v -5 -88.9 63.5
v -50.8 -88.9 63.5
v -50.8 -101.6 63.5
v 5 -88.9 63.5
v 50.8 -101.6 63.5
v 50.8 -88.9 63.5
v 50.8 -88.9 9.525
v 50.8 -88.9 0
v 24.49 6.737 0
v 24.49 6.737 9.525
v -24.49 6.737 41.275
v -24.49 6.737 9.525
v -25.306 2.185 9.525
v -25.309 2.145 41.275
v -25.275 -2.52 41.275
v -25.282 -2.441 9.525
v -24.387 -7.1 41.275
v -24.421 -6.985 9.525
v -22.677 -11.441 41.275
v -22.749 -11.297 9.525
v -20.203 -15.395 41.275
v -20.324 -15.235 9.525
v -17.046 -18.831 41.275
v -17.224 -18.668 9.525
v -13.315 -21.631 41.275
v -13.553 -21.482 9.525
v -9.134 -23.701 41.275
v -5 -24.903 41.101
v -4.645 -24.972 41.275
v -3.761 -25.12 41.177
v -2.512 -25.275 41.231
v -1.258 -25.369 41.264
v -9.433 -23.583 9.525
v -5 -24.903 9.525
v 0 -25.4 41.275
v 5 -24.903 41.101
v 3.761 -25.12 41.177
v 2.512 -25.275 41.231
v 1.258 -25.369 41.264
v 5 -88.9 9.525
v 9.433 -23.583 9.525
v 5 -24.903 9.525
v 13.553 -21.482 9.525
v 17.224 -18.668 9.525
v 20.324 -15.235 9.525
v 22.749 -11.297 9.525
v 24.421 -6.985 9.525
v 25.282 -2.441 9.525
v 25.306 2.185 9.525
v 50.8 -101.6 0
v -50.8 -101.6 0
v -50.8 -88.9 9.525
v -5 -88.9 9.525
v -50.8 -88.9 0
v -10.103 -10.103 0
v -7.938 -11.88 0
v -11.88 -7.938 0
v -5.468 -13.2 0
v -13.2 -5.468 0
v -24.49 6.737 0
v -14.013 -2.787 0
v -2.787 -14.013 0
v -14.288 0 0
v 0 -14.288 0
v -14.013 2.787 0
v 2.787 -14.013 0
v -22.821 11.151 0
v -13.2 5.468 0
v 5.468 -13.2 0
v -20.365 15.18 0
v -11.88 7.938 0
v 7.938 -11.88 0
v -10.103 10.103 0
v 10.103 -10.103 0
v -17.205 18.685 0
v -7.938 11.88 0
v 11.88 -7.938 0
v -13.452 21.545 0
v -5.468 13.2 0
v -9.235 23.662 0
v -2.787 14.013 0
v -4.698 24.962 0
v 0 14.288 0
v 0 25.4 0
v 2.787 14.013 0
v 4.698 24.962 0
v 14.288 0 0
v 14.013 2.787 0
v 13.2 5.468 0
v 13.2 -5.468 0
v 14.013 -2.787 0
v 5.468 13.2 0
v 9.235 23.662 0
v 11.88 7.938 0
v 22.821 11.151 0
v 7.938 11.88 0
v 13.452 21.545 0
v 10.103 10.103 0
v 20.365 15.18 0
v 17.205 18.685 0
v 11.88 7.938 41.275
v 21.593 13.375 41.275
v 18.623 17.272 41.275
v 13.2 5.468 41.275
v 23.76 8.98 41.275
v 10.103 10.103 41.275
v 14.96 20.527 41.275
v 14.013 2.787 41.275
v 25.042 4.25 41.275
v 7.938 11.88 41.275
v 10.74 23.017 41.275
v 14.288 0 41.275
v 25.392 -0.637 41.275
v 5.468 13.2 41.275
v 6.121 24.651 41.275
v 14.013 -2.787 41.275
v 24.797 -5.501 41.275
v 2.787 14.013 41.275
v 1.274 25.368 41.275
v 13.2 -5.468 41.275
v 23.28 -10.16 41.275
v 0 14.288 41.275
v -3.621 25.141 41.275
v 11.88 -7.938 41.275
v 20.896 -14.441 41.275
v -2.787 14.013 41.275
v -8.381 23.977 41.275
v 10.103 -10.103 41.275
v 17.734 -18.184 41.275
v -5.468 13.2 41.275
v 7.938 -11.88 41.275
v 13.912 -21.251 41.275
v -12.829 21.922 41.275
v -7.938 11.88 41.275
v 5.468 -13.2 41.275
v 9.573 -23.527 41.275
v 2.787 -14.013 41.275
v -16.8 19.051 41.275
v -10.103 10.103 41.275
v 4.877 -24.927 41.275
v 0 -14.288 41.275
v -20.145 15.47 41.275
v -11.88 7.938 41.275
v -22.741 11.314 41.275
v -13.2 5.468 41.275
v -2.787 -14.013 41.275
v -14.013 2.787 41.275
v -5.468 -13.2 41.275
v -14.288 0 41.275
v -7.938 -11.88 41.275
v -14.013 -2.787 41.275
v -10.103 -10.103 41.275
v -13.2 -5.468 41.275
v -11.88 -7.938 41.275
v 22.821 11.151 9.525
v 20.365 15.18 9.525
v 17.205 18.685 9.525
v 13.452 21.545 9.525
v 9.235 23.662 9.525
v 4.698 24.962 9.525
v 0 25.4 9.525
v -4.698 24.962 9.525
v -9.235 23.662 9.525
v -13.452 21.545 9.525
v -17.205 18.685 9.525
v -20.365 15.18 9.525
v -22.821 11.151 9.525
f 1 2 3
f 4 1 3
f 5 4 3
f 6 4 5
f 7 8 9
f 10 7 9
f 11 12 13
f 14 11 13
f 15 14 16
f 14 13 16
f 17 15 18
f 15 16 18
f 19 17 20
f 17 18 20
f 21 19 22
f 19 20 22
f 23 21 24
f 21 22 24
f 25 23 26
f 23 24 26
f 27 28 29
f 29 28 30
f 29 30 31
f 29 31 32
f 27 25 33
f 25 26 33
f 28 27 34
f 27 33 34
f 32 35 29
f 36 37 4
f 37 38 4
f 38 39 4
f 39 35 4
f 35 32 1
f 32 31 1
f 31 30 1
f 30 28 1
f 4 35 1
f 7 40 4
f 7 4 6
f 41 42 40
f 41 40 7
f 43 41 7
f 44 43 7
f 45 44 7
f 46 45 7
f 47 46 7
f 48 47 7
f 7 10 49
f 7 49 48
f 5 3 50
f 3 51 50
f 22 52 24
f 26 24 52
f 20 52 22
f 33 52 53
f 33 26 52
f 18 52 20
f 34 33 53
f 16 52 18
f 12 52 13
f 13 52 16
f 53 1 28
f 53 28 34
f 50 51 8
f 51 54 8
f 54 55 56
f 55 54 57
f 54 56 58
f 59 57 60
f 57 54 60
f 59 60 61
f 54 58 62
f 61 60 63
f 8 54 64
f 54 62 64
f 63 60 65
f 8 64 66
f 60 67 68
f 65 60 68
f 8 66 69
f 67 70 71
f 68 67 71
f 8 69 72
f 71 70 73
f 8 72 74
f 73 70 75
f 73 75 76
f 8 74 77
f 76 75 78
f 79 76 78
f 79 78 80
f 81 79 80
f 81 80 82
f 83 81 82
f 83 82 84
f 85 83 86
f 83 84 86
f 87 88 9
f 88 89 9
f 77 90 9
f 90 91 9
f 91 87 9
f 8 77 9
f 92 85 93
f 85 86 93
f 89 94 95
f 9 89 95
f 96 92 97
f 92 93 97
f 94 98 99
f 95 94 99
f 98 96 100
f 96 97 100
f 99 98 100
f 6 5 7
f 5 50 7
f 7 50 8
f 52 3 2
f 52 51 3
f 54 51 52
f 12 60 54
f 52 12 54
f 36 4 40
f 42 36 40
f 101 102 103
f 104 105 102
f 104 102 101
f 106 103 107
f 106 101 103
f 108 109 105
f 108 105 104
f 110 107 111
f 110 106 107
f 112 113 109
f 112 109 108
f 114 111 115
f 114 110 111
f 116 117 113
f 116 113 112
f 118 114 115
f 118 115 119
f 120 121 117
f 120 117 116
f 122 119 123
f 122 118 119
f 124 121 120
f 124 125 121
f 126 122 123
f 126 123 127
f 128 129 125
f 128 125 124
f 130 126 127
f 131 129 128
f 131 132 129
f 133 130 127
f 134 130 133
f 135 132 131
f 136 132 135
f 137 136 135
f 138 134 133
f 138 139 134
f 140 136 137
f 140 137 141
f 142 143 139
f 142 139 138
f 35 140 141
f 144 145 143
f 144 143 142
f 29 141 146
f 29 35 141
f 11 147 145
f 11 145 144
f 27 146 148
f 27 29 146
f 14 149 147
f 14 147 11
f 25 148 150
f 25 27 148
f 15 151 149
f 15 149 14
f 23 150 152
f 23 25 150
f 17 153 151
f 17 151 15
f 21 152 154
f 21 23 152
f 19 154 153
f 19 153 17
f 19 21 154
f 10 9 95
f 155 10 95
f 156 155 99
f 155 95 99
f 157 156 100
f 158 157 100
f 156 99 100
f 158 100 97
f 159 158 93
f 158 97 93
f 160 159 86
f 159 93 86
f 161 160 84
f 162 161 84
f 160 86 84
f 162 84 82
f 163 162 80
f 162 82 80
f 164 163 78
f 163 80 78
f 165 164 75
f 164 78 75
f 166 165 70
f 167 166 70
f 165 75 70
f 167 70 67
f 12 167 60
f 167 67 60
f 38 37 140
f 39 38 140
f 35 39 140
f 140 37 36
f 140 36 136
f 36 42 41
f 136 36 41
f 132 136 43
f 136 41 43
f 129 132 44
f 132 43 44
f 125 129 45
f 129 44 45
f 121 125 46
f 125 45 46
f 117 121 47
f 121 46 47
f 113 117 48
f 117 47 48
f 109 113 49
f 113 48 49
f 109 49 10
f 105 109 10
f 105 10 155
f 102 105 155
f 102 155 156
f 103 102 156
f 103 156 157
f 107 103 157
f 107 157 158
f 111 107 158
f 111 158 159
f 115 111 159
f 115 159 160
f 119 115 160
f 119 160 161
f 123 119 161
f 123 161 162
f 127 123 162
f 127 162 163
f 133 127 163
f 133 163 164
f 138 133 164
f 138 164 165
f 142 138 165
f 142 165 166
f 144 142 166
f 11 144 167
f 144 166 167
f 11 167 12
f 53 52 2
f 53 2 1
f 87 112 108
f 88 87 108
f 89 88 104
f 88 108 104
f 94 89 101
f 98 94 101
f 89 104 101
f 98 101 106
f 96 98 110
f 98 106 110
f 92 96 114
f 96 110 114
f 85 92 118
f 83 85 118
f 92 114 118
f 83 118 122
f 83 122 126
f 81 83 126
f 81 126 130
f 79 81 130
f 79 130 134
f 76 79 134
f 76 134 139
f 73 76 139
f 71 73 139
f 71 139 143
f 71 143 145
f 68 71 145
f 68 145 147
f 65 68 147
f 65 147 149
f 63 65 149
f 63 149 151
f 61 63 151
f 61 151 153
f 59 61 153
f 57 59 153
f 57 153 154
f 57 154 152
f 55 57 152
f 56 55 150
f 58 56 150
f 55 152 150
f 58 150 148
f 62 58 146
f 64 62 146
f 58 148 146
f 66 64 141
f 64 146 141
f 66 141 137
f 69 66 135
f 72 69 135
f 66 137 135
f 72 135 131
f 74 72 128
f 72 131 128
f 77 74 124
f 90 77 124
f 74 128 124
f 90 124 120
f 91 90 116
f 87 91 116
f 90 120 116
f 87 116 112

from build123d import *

# Parameters (mm, degrees)
BASE_EXTRUDE_DEPTH  = 9.525
BOSS_EXTRUDE1_DEPTH = 53.974999999999994
SKETCH3_R           = 25.400000000000002
BOSS_EXTRUDE2_DEPTH = 31.75
SKETCH4_R           = 14.287500000000001
CUT_EXTRUDE1_DEPTH  = 121.85870107278168
RIB1_REACH          = 132.136
SKETCH5_WALL_W      = 329.54959327419806
SKETCH5_WALL_H      = 10


with BuildPart() as part:
    # Sketch1 → Base-Extrude (new body)
    with BuildSketch(Plane.XY):
        with BuildLine():
            Line((-50.800000000000004, -101.6), (50.79999999999999, -101.59999999999998))
            Line((50.79999999999999, -101.59999999999998), (50.79999999999999, -88.9))
            Line((50.79999999999999, -88.9), (24.490190651941575, 6.737251801109487))
            ThreePointArc((24.490190651941575, 6.737251801109487), (-4.08e-15, 25.39999999999999), (-24.490190651941617, 6.737251801109478))
            Line((-24.490190651941617, 6.737251801109478), (-50.79999999999999, -88.90000000000002))
            Line((-50.79999999999999, -88.90000000000002), (-50.800000000000004, -101.6))
        make_face()
    extrude(amount=BASE_EXTRUDE_DEPTH)

    # Sketch2 → Boss-Extrude1 (add)
    with BuildSketch(Plane.XY.offset(9.525)):
        Polygon((50.79999999999999, -101.59999999999998), (50.79999999999999, -88.9), (-50.79999999999999, -88.90000000000002), (-50.800000000000004, -101.6), align=None)
    extrude(amount=BOSS_EXTRUDE1_DEPTH)

    # Sketch3 → Boss-Extrude2 (add)
    with BuildSketch(Plane.XY.offset(9.525)):
        Circle(SKETCH3_R)
    extrude(amount=BOSS_EXTRUDE2_DEPTH)

    # Sketch4 → Cut-Extrude1 (cut, through all)
    with BuildSketch(Plane.XY.offset(41.275)):
        Circle(SKETCH4_R)
    extrude(amount=-CUT_EXTRUDE1_DEPTH, mode=Mode.SUBTRACT)

    # Sketch5 wall → Rib1 (add, up to next)
    with BuildSketch(Plane(origin=(0, -57.15, 52.3875), x_dir=(0, 0.943858356366, -0.330350424728), z_dir=(0, 0.330350424728, 0.943858356366)), mode=Mode.PRIVATE) as rib1_sk1:
        Rectangle(SKETCH5_WALL_W, SKETCH5_WALL_H)
    rib1_tool1 = extrude(rib1_sk1.sketch, amount=-RIB1_REACH, mode=Mode.PRIVATE) - part.part
    add(rib1_tool1.solids().sort_by_distance((0, -57.15, 52.3875))[0])


solid = part.part
